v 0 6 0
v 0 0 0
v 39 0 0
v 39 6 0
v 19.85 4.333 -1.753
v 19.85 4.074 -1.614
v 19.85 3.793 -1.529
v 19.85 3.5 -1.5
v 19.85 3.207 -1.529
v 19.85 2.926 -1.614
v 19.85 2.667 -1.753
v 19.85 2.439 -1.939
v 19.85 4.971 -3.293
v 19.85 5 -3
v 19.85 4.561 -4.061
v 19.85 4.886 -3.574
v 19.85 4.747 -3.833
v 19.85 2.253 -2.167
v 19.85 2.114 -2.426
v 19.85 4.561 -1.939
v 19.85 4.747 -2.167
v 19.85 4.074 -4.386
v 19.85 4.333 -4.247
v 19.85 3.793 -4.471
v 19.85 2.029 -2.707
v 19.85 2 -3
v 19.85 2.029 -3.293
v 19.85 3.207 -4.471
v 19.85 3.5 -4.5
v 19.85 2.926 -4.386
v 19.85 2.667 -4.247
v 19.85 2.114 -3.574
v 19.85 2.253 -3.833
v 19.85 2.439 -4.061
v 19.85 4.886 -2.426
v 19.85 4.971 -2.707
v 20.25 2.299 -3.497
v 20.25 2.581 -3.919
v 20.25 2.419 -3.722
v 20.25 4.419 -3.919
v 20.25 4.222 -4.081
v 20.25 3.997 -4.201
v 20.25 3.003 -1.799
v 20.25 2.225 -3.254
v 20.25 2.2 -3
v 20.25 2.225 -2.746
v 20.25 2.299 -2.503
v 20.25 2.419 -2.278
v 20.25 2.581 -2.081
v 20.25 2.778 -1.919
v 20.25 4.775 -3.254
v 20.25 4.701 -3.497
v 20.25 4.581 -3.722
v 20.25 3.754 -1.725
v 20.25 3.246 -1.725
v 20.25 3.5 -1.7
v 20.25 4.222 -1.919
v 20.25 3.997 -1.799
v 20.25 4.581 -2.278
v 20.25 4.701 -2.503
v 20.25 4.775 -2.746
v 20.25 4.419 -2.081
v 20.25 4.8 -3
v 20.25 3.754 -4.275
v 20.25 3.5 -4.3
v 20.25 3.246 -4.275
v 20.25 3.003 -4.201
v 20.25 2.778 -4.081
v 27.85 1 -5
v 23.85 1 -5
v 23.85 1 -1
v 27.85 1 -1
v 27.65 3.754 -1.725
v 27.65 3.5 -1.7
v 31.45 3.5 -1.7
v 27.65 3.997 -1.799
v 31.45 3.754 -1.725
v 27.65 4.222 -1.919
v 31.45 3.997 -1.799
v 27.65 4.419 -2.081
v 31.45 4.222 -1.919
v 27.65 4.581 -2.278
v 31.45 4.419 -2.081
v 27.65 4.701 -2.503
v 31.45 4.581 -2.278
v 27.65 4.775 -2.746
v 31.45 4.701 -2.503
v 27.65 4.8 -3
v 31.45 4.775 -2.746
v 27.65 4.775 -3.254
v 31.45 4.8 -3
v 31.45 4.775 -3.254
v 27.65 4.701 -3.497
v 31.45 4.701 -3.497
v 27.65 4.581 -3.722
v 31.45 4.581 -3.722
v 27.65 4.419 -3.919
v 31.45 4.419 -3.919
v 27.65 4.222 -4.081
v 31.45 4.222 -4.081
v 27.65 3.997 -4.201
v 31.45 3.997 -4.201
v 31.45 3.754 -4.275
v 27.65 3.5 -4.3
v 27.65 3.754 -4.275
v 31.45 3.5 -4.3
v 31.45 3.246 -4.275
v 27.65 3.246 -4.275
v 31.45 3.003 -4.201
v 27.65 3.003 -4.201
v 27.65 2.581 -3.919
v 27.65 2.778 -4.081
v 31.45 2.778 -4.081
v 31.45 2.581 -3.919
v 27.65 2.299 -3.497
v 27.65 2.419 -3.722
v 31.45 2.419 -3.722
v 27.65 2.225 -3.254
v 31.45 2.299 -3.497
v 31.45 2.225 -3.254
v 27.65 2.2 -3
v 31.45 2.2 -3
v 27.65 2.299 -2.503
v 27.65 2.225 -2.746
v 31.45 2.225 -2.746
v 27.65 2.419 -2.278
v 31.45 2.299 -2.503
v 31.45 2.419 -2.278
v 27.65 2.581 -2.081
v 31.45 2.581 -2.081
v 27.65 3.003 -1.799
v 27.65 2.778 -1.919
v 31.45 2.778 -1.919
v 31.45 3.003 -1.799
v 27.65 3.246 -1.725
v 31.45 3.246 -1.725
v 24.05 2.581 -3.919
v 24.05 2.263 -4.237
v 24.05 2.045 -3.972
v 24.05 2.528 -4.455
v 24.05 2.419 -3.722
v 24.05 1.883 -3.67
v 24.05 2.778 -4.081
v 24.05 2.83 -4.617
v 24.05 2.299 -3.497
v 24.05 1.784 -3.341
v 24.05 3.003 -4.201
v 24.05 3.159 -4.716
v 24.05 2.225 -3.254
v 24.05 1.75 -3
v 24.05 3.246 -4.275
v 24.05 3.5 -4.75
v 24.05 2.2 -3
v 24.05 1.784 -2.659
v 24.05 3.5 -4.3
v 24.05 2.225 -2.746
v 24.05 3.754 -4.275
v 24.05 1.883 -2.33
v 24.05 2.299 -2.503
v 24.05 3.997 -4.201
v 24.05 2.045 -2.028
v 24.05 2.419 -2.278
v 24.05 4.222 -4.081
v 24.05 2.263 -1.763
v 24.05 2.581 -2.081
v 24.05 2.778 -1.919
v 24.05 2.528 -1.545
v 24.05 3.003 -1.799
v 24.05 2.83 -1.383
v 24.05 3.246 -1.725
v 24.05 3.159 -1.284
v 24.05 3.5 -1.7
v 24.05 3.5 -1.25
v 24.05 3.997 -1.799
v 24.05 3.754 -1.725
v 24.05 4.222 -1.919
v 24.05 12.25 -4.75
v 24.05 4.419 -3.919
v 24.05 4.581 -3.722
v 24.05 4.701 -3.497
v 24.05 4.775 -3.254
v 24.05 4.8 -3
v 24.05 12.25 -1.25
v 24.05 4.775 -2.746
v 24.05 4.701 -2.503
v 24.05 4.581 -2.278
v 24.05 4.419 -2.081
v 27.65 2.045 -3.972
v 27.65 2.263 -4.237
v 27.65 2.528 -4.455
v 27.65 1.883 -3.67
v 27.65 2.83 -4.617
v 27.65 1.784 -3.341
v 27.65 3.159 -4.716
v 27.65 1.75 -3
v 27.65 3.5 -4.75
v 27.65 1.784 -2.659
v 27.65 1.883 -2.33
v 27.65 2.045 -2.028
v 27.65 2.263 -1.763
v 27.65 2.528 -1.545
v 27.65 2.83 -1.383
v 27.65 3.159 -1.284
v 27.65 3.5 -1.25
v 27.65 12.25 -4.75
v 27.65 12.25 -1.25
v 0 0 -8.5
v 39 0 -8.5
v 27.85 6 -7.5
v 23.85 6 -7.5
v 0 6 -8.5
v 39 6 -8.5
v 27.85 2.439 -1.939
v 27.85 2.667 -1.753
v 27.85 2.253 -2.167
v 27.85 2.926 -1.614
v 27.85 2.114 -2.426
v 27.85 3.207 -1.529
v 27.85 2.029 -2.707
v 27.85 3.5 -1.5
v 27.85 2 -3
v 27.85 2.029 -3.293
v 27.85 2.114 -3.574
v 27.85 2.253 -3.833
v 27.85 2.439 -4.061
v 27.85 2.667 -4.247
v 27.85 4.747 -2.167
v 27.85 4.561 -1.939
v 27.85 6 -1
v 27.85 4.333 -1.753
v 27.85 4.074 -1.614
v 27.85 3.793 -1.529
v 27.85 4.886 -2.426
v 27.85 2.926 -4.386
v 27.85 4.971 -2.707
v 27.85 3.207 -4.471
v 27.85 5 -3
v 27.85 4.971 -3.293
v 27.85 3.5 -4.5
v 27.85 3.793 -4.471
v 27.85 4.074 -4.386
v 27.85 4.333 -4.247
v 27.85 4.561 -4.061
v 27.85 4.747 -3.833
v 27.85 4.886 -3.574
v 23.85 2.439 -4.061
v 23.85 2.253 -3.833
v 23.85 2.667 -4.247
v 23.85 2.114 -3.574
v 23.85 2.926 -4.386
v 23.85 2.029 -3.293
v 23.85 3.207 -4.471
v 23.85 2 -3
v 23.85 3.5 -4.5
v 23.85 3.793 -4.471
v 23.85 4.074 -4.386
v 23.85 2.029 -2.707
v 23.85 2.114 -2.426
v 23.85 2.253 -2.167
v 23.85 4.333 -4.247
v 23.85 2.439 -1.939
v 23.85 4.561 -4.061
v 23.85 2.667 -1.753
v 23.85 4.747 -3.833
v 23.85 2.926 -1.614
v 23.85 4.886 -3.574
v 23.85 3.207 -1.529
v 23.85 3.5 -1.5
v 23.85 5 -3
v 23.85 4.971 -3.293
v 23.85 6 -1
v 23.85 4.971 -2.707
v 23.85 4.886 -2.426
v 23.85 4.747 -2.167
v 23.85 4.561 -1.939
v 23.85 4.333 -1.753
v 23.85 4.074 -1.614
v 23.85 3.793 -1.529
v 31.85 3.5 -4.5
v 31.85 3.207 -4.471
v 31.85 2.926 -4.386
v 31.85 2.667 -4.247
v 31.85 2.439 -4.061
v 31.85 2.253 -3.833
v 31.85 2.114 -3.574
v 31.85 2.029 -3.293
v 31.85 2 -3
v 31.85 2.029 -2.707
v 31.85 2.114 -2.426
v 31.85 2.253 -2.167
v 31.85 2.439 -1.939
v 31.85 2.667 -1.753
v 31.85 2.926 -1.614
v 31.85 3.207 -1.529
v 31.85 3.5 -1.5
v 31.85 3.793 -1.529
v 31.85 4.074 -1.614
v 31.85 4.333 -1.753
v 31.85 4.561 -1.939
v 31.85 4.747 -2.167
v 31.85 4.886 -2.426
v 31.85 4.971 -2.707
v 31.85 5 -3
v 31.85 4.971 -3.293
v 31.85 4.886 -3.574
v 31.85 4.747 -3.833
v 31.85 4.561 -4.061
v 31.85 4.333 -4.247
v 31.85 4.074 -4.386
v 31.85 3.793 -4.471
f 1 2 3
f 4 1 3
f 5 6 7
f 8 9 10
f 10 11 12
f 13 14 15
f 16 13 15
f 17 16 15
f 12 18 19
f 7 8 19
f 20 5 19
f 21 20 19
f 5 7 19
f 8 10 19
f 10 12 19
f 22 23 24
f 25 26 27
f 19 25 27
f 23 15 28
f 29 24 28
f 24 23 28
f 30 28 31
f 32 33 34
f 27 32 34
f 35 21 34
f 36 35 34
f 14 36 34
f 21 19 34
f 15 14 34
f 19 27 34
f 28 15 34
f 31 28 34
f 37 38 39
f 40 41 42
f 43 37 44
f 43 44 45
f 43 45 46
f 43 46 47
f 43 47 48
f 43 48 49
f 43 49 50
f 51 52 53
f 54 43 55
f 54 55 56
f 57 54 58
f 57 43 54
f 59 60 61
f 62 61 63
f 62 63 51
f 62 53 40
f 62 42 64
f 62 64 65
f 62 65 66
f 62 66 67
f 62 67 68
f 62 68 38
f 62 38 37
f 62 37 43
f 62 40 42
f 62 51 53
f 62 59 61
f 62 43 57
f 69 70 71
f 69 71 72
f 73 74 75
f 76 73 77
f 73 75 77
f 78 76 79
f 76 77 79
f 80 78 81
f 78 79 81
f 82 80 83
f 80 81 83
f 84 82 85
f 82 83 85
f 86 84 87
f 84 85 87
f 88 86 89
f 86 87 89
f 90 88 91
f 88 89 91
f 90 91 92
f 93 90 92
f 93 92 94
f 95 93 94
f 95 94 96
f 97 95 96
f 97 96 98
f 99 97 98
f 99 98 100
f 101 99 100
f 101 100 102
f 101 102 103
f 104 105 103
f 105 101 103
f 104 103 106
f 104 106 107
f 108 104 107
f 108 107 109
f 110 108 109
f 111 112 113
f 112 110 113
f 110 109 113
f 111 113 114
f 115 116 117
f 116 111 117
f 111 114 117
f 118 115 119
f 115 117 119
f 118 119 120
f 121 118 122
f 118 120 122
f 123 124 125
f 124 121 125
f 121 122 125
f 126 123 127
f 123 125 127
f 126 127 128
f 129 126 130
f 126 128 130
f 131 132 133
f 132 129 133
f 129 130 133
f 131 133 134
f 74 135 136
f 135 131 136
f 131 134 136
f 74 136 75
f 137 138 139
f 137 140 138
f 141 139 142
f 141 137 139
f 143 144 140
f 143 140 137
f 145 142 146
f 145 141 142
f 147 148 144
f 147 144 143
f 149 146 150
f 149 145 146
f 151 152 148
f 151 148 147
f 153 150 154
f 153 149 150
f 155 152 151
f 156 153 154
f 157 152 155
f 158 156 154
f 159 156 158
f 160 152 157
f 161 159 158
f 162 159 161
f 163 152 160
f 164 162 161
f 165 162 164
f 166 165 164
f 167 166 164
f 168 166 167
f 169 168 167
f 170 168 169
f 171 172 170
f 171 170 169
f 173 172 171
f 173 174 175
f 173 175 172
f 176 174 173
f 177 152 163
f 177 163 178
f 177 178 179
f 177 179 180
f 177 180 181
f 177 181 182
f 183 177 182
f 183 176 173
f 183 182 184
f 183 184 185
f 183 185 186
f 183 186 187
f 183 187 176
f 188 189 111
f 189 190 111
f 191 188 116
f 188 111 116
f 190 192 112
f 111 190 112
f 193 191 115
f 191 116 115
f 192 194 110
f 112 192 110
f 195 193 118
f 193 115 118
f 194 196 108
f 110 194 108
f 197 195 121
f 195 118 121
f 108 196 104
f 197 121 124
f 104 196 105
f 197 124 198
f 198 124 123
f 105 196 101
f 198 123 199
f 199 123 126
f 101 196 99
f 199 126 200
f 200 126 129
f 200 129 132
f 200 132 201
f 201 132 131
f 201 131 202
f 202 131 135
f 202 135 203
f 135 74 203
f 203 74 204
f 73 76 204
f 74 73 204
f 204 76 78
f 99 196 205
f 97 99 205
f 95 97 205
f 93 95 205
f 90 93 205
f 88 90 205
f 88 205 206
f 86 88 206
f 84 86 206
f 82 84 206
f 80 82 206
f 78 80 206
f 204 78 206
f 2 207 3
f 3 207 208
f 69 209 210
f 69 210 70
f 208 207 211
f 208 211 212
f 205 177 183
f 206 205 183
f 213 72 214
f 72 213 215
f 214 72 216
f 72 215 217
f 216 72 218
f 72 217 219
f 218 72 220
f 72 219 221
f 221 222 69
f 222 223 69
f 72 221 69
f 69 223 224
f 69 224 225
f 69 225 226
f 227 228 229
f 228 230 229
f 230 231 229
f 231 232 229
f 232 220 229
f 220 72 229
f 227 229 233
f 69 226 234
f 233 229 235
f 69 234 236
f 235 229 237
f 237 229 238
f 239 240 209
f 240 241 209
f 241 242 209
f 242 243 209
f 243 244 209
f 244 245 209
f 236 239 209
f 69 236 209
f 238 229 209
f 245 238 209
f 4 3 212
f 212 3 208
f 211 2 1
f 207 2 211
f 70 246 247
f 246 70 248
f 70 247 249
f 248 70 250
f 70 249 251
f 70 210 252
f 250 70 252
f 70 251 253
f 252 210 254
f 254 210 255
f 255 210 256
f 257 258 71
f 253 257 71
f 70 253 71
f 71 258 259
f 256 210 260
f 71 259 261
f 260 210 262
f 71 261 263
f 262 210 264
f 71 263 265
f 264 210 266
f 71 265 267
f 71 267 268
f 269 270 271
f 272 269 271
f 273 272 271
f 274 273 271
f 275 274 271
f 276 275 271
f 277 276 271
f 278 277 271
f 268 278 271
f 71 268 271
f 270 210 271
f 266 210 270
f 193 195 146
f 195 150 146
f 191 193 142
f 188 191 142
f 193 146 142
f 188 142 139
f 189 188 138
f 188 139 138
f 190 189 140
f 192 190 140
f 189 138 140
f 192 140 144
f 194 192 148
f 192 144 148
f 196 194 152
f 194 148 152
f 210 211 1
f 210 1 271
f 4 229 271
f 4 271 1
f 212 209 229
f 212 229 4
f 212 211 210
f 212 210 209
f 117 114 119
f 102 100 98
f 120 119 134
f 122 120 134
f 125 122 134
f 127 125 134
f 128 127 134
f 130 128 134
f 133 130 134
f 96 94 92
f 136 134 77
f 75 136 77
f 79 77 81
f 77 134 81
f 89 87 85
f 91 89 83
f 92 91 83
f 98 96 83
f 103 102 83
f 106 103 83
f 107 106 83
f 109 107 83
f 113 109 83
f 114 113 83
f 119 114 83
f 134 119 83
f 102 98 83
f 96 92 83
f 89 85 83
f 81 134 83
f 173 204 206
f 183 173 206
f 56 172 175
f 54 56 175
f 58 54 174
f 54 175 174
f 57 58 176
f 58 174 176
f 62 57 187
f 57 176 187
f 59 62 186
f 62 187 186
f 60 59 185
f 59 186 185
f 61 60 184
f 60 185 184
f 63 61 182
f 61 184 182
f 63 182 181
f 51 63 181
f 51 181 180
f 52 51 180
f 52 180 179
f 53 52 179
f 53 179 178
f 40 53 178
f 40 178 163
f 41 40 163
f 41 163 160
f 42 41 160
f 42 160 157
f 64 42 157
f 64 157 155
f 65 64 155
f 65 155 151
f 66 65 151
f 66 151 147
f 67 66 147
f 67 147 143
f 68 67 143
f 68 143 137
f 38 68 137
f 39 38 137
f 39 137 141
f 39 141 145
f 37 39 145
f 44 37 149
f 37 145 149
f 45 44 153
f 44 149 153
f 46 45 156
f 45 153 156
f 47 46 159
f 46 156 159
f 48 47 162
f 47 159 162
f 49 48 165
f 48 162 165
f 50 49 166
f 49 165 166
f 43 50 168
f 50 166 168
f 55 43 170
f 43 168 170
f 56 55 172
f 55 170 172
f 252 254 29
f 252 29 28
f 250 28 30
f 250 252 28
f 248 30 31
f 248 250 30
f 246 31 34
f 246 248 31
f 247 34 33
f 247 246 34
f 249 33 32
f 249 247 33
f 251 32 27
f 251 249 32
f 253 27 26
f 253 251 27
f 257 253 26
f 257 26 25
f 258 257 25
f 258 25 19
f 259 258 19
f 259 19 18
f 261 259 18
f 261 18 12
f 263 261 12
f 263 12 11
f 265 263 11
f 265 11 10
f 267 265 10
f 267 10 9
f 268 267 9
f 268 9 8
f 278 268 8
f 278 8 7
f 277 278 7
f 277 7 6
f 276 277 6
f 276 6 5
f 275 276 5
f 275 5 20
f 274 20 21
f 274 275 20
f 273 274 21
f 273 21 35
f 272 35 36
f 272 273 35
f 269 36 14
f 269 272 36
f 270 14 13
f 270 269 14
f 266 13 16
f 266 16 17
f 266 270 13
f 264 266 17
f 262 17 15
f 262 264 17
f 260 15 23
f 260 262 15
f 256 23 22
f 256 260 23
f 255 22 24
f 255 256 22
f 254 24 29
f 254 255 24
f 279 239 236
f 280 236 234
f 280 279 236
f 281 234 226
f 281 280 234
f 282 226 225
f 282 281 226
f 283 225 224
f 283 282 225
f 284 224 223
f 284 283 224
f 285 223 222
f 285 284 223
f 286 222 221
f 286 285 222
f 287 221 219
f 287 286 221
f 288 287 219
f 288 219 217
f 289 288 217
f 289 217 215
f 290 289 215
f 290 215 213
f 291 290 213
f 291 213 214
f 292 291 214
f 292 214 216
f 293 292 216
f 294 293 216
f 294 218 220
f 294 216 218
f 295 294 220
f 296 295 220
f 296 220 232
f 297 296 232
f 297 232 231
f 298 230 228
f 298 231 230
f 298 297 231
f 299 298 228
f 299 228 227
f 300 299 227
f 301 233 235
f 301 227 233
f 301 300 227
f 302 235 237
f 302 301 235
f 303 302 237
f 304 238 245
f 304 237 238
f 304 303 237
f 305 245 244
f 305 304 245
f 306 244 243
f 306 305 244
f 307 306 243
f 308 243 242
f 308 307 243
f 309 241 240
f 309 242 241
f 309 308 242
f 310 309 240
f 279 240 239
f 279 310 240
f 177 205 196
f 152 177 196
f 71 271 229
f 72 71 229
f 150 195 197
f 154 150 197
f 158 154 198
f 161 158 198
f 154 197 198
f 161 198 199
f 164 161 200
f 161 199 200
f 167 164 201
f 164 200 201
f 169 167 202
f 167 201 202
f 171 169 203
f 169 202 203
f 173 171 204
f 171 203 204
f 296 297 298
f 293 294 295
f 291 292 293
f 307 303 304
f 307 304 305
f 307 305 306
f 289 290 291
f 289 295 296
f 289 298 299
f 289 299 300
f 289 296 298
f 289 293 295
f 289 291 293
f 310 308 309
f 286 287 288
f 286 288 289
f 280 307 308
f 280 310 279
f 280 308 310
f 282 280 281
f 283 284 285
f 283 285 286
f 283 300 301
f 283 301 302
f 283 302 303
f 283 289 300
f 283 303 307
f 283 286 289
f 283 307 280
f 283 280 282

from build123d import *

# Parameters (mm, degrees)
SKETCH1_W                = 39
SKETCH1_H                = 8.5
BOSS_EXTRUDE1_DEPTH      = 6
SKETCH2_W                = 4
SKETCH2_H                = 4
CUT_EXTRUDE1_DEPTH       = 5
CUT_EXTRUDE2_DEPTH       = 8
CUT_EXTRUDE2_DEPTH_BACK  = 4
SKETCH3_R                = 1.5
BOSS_EXTRUDE2_START      = 0.2
SKETCH4_W                = 3.5
SKETCH4_H                = 6.25
SKETCH4_H_2              = 0.75
SKETCH4_R                = 1.5
SKETCH4_R_2              = 1.3
BOSS_EXTRUDE2_DEPTH      = 3.6
BOSS_EXTRUDE3_DEPTH      = 7.6
BOSS_EXTRUDE3_DEPTH_BACK = 3.6
SKETCH4_3_R              = 1.3
FILLET1_R                = 1.75
CUT_EXTRUDE3_DEPTH       = 4


with BuildPart() as part:
    # Sketch1 → Boss-Extrude1 (new body)
    with BuildSketch(Plane(origin=(0, 0, 0), x_dir=(1, 0, 0), z_dir=(0, 1, 0))):
        with Locations((19.5, 4.25)):
            Rectangle(SKETCH1_W, SKETCH1_H)
    extrude(amount=BOSS_EXTRUDE1_DEPTH)

    # Sketch2 → Cut-Extrude1 (cut)
    with BuildSketch(Plane(origin=(0, 6, 0), x_dir=(1, 0, 0), z_dir=(0, 1, 0))):
        with Locations((25.85, 3)):
            Rectangle(SKETCH2_W, SKETCH2_H)
    extrude(amount=-CUT_EXTRUDE1_DEPTH, mode=Mode.SUBTRACT)

    # Sketch3 → Cut-Extrude2 (cut, two sides: drawn at the far end of the back side and taken through both)
    with BuildSketch(Plane.ZY.offset(-27.85).offset(-CUT_EXTRUDE2_DEPTH_BACK)):
        with Locations(Location((-3, 3.5, 0), (0, 0, 180))):
            Circle(SKETCH3_R)
    extrude(amount=CUT_EXTRUDE2_DEPTH + CUT_EXTRUDE2_DEPTH_BACK, mode=Mode.SUBTRACT)

    # Sketch5 → Cut-Extrude3 (cut)
    with BuildSketch(Plane.ZY.offset(-27.85)):
        Polygon((-5, 6), (-7.5, 6), (-5, 1), align=None)
    extrude(amount=CUT_EXTRUDE3_DEPTH, mode=Mode.SUBTRACT)


with BuildPart() as body_2:
    # Sketch4 → Boss-Extrude2 (new body)
    # profile 1 of 5: a face of its own
    with BuildSketch(Plane.ZY.offset(-27.85).offset(BOSS_EXTRUDE2_START)):
        with Locations((-3, 9.125)):
            Rectangle(SKETCH4_W, SKETCH4_H)
    # profile 2 of 5: a face of its own
    with BuildSketch(Plane.ZY.offset(-27.85).offset(BOSS_EXTRUDE2_START)):
        with Locations((-3, 5.625)):
            Rectangle(SKETCH4_W, SKETCH4_H_2)
    # profile 3 of 5: a face of its own
    with BuildSketch(Plane.ZY.offset(-27.85).offset(BOSS_EXTRUDE2_START)):
        with BuildLine():
            Line((-4.75, 1.75), (-3, 1.75))
            ThreePointArc((-3, 1.75), (-1.762563133, 2.262563133), (-1.25, 3.5))
            Line((-1.25, 3.5), (-1.25, 5.25))
            Line((-1.25, 5.25), (-4.75, 5.25))
            Line((-4.75, 5.25), (-4.75, 1.75))
        make_face()
        with Locations(Location((-3, 3.5, 0), (0, 0, 180))):
            Circle(SKETCH4_R, mode=Mode.SUBTRACT)
    # profile 4 of 5: a face of its own
    with BuildSketch(Plane.ZY.offset(-27.85).offset(BOSS_EXTRUDE2_START)):
        with Locations(Location((-3, 3.5, 0), (0, 0, 180))):
            Circle(SKETCH4_R)
        with Locations((-3, 3.5)):
            Circle(SKETCH4_R_2, mode=Mode.SUBTRACT)
    # profile 5 of 5: a face of its own
    with BuildSketch(Plane.ZY.offset(-27.85).offset(BOSS_EXTRUDE2_START)):
        with Locations((-3, 3.5)):
            Circle(SKETCH4_R_2)
    extrude(amount=BOSS_EXTRUDE2_DEPTH)

    # Sketch4<3> → Boss-Extrude3 (add, two sides: drawn at the far end of the back side and taken through both)
    with BuildSketch(Plane.ZY.offset(-27.85).offset(-BOSS_EXTRUDE3_DEPTH_BACK)):
        with Locations((-3, 3.5)):
            Circle(SKETCH4_3_R)
    extrude(amount=BOSS_EXTRUDE3_DEPTH + BOSS_EXTRUDE3_DEPTH_BACK)

    # Fillet1
    fillet1_edges = [body_2.edges().sort_by_distance(p)[0] for p in [
        (25.85, 1.75, -4.75),
    ]]
    fillet(fillet1_edges, radius=FILLET1_R - 0.0001)  # a hair under: the kernel refuses the full size


solid = Compound([part.part, body_2.part])
